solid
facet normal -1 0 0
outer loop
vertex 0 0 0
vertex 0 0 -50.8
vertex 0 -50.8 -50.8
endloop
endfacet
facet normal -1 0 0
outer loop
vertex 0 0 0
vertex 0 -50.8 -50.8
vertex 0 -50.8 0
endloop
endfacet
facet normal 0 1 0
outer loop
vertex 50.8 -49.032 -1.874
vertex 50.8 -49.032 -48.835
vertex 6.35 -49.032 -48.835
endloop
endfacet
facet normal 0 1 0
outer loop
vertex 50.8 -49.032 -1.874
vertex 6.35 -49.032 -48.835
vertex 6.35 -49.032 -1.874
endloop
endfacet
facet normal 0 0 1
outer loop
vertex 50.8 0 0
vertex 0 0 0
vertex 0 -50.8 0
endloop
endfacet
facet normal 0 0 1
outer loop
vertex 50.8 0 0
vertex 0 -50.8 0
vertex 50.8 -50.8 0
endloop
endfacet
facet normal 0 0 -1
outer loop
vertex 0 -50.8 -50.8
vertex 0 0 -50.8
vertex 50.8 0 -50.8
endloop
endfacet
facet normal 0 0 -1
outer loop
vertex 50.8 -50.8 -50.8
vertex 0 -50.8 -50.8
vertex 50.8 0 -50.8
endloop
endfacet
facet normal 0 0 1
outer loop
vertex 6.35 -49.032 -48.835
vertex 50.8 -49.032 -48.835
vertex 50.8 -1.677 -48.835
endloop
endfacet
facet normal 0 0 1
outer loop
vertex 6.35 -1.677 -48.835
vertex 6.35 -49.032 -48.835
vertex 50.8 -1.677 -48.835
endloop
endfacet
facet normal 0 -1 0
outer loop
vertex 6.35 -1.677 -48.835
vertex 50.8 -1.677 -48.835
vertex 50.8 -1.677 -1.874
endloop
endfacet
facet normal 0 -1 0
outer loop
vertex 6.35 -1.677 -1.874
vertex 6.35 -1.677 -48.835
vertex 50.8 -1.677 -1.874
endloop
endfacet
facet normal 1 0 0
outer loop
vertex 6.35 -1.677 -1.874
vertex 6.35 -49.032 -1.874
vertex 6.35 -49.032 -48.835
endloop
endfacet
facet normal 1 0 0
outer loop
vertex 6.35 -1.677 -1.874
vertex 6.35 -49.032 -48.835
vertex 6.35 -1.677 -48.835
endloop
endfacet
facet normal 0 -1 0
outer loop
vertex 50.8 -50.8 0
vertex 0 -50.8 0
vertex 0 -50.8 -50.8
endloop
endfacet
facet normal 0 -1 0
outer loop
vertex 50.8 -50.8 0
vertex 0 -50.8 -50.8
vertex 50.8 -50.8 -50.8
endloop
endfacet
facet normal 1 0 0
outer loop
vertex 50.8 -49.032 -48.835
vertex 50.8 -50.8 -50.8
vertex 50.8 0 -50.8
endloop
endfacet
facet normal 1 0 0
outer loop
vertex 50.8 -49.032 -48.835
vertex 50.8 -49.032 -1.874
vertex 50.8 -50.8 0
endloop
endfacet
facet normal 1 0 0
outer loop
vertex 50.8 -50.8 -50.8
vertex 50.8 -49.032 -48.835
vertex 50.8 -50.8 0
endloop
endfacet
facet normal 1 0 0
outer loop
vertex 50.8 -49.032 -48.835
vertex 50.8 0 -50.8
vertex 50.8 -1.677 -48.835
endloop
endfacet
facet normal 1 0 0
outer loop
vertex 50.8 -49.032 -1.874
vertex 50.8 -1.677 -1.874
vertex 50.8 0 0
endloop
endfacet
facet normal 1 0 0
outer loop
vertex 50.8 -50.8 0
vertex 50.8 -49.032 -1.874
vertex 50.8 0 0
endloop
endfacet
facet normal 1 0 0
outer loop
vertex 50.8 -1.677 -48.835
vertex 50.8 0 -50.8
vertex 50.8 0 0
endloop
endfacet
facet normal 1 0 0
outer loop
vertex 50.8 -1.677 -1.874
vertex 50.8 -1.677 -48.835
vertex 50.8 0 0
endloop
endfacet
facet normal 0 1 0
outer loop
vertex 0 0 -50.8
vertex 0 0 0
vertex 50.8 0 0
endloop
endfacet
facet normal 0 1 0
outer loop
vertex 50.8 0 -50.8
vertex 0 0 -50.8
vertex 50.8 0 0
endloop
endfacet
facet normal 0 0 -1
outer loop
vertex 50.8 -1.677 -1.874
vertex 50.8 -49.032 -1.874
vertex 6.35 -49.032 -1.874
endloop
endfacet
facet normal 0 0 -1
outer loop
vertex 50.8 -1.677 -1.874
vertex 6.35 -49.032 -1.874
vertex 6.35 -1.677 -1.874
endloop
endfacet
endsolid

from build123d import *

# Parameters (mm, degrees)
F0_W     = 50.8
F0_H     = 50.8
F1_DEPTH = 50.8
F2_W     = 46.3804
F2_H     = 46.7614
F3_DEPTH = 44.45
F4_W     = 47.35487
F4_H     = 46.960247
F5_DEPTH = 44.45


with BuildPart() as f1:
    # F0 (on Front) → F1 (new body)
    with BuildSketch(Plane.XZ):
        with Locations((25.4, -25.4)):
            Rectangle(F0_W, F0_H)
    extrude(amount=F1_DEPTH)

    # F2 (on Right) → F3 (cut)
    with BuildSketch(Plane.YZ):
        with Locations((-25.459287, -25.454011)):
            Rectangle(F2_W, F2_H)
    extrude(amount=-F3_DEPTH, mode=Mode.SUBTRACT)

    # F4 (on face) → F5 (cut)
    with BuildSketch(Plane.YZ.offset(50.8)):
        with Locations((-25.354586, -25.354588)):
            Rectangle(F4_W, F4_H)
    extrude(amount=-F5_DEPTH, mode=Mode.SUBTRACT)


solid = f1.part
